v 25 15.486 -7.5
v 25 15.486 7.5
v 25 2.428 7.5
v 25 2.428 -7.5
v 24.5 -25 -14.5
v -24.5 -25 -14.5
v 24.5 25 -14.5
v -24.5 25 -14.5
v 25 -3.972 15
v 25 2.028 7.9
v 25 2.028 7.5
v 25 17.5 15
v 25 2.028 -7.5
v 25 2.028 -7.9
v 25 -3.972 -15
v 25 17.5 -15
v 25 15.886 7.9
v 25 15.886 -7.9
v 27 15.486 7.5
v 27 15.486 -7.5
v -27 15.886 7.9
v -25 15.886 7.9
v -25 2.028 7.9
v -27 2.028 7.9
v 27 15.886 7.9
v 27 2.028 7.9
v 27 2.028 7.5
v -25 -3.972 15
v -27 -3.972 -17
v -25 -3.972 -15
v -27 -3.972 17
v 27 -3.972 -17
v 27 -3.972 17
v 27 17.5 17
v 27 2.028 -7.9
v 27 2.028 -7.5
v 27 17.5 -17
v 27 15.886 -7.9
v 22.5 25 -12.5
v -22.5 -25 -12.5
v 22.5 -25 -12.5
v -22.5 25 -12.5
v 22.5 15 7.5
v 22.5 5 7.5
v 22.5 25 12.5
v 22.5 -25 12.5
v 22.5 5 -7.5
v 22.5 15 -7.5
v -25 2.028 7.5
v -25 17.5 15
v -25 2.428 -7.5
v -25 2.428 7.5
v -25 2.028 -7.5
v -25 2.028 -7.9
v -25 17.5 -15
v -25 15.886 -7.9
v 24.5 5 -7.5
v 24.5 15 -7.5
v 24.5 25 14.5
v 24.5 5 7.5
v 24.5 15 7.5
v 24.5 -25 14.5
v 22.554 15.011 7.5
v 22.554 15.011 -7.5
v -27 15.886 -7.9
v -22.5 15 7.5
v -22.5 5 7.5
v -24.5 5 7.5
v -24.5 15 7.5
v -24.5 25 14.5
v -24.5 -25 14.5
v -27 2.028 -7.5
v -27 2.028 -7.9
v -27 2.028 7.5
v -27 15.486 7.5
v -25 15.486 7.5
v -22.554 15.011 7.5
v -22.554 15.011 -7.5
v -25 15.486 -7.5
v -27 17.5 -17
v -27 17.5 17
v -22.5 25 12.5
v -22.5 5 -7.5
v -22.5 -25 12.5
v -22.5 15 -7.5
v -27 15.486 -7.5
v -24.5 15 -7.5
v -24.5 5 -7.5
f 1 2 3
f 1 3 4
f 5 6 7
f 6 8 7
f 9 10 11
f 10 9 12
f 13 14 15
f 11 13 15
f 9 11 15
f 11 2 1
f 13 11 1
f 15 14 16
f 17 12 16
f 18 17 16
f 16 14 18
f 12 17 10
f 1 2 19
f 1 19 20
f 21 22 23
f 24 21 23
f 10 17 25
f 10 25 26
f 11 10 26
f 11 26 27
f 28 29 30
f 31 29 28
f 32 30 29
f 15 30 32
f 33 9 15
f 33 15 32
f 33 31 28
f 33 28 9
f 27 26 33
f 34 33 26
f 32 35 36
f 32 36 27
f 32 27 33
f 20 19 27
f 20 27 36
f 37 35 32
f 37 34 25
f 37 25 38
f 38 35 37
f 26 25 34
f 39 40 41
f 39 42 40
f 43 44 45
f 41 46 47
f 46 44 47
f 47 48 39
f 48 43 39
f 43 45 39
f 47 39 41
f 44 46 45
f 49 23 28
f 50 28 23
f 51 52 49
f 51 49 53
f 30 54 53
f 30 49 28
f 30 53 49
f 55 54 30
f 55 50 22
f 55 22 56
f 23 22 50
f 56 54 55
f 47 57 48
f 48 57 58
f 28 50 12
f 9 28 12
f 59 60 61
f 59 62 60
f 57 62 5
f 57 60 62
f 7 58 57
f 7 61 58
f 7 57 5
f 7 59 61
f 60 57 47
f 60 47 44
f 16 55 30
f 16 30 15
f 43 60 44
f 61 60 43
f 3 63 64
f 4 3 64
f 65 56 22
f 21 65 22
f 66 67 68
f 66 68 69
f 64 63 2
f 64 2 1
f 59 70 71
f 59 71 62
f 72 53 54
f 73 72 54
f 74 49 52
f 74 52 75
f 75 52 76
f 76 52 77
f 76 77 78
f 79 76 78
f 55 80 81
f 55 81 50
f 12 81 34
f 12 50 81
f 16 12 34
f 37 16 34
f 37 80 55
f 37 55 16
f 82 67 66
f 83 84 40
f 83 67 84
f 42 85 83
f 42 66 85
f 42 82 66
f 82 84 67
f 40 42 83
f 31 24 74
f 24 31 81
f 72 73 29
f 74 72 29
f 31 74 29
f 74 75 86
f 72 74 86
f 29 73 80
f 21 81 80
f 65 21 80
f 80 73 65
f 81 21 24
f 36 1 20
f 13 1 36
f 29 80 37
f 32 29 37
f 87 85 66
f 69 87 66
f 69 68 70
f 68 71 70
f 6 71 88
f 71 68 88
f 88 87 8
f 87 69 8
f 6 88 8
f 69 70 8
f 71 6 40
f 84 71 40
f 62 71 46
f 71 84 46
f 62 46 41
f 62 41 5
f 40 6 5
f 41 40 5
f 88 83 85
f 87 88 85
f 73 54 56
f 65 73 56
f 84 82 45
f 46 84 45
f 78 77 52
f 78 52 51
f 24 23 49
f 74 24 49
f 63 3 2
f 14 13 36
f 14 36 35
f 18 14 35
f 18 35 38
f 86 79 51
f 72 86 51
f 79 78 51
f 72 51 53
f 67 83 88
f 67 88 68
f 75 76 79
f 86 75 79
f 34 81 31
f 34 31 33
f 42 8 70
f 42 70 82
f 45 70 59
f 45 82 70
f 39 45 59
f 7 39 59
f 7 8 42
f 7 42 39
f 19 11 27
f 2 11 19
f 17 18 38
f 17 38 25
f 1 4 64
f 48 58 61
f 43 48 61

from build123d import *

# Parameters (mm, degrees)
CROQUIS1_W                 = 49
CROQUIS1_H                 = 29
CROQUIS1_W_2               = 45
CROQUIS1_H_2               = 25
SALIENTE_EXTRUIR1_DEPTH    = 25
CROQUIS2_W                 = 54
CROQUIS2_H                 = 34
CROQUIS2_W_2               = 50
CROQUIS2_H_2               = 30
SALIENTE_EXTRUIR2_DEPTH    = 17.5
CORTAR_EXTRUIR1_START      = -2
CROQUIS3_W                 = 15
CROQUIS3_H                 = 10
CORTAR_EXTRUIR1_DEPTH      = 49
SALIENTE_EXTRUIR3_REACH    = 63.904
CROQUIS4_W                 = 15
CROQUIS4_H                 = 12.818311358
CORTAR_EXTRUIR2_DEPTH      = 2
CROQUIS7_W                 = 54
CROQUIS7_H                 = 13.527722992
CORTAR_EXTRUIR3_DEPTH      = 51.0999002
CORTAR_EXTRUIR3_DEPTH_BACK = 51.0999002


with BuildPart() as part:
    # Croquis1 → Saliente-Extruir1 (new, symmetric)
    with BuildSketch(Plane(origin=(0, 0, 0), x_dir=(1, 0, 0), z_dir=(0, 1, 0))):
        Rectangle(CROQUIS1_W, CROQUIS1_H)
        Rectangle(CROQUIS1_W_2, CROQUIS1_H_2, mode=Mode.SUBTRACT)
    extrude(amount=SALIENTE_EXTRUIR1_DEPTH, both=True)

    # Croquis3 → Cortar-Extruir1 (cut)
    with BuildSketch(Plane.ZY.offset(-22.5).offset(CORTAR_EXTRUIR1_START)):
        with Locations((0, 10)):
            Rectangle(CROQUIS3_W, CROQUIS3_H)
    extrude(amount=CORTAR_EXTRUIR1_DEPTH, mode=Mode.SUBTRACT)


with BuildPart() as body_2:
    # Croquis2 → Saliente-Extruir2 (new, symmetric)
    with BuildSketch(Plane(origin=(0, 0, 0), x_dir=(1, 0, 0), z_dir=(0, 1, 0))):
        Rectangle(CROQUIS2_W, CROQUIS2_H)
        Rectangle(CROQUIS2_W_2, CROQUIS2_H_2, mode=Mode.SUBTRACT)
    extrude(amount=SALIENTE_EXTRUIR2_DEPTH, both=True)


with BuildPart() as body_3:

    # Croquis4 → Saliente-Extruir3 (new, up to next)
    with BuildSketch(Plane(origin=(24.544518702, 4.770971133, 0), x_dir=(0, 0, -1), z_dir=(0.9816271834476652, 0.19080899537653845, 0)), mode=Mode.PRIVATE) as saliente_extruir3_sk1:
        with Locations((0, 4.022049677)):
            Rectangle(CROQUIS4_W, CROQUIS4_H)
    saliente_extruir3_tool1 = extrude(saliente_extruir3_sk1.sketch, amount=SALIENTE_EXTRUIR3_REACH, mode=Mode.PRIVATE) - body_2.part
    saliente_extruir3 = saliente_extruir3_tool1.solids().sort_by_distance((23.777075, 8.719124, 0))[0]
    add(saliente_extruir3)


with BuildPart() as body_2_1:
    add(body_2.part)

    # Croquis6 → Cortar-Extruir2 (cut)
    with BuildSketch(Plane.ZY.offset(-25)):
        Polygon((-7.9, 15.885950773), (7.9, 15.885950773), (7.9, 2.027722992), (7.5, 2.027722992), (7.5, 15.485950773), (-7.5, 15.485950773), (-7.5, 2.027722992), (-7.9, 2.027722992), align=None)
    cortar_extruir2 = extrude(amount=-CORTAR_EXTRUIR2_DEPTH, mode=Mode.SUBTRACT)

    # Simetría1: Saliente-Extruir3 across plane
    add(saliente_extruir3.mirror(Plane(origin=(0, 0, 0), x_dir=(0, 0, 1), z_dir=(1, 0, 0))))

    # Simetr_a1 2: Cortar-Extruir2 across plane
    add(cortar_extruir2.mirror(Plane(origin=(0, 0, 0), x_dir=(0, 0, 1), z_dir=(1, 0, 0))), mode=Mode.SUBTRACT)

    # Croquis7 → Cortar-Extruir3 (cut, two sides)
    with BuildSketch(Plane.XY.offset(17)) as cortar_extruir3_sk:
        with Locations((0, -10.736138504)):
            Rectangle(CROQUIS7_W, CROQUIS7_H)
    extrude(amount=CORTAR_EXTRUIR3_DEPTH, mode=Mode.SUBTRACT)
    extrude(cortar_extruir3_sk.sketch, amount=-CORTAR_EXTRUIR3_DEPTH_BACK, mode=Mode.SUBTRACT)


solid = Compound([part.part, body_3.part, body_2_1.part])
